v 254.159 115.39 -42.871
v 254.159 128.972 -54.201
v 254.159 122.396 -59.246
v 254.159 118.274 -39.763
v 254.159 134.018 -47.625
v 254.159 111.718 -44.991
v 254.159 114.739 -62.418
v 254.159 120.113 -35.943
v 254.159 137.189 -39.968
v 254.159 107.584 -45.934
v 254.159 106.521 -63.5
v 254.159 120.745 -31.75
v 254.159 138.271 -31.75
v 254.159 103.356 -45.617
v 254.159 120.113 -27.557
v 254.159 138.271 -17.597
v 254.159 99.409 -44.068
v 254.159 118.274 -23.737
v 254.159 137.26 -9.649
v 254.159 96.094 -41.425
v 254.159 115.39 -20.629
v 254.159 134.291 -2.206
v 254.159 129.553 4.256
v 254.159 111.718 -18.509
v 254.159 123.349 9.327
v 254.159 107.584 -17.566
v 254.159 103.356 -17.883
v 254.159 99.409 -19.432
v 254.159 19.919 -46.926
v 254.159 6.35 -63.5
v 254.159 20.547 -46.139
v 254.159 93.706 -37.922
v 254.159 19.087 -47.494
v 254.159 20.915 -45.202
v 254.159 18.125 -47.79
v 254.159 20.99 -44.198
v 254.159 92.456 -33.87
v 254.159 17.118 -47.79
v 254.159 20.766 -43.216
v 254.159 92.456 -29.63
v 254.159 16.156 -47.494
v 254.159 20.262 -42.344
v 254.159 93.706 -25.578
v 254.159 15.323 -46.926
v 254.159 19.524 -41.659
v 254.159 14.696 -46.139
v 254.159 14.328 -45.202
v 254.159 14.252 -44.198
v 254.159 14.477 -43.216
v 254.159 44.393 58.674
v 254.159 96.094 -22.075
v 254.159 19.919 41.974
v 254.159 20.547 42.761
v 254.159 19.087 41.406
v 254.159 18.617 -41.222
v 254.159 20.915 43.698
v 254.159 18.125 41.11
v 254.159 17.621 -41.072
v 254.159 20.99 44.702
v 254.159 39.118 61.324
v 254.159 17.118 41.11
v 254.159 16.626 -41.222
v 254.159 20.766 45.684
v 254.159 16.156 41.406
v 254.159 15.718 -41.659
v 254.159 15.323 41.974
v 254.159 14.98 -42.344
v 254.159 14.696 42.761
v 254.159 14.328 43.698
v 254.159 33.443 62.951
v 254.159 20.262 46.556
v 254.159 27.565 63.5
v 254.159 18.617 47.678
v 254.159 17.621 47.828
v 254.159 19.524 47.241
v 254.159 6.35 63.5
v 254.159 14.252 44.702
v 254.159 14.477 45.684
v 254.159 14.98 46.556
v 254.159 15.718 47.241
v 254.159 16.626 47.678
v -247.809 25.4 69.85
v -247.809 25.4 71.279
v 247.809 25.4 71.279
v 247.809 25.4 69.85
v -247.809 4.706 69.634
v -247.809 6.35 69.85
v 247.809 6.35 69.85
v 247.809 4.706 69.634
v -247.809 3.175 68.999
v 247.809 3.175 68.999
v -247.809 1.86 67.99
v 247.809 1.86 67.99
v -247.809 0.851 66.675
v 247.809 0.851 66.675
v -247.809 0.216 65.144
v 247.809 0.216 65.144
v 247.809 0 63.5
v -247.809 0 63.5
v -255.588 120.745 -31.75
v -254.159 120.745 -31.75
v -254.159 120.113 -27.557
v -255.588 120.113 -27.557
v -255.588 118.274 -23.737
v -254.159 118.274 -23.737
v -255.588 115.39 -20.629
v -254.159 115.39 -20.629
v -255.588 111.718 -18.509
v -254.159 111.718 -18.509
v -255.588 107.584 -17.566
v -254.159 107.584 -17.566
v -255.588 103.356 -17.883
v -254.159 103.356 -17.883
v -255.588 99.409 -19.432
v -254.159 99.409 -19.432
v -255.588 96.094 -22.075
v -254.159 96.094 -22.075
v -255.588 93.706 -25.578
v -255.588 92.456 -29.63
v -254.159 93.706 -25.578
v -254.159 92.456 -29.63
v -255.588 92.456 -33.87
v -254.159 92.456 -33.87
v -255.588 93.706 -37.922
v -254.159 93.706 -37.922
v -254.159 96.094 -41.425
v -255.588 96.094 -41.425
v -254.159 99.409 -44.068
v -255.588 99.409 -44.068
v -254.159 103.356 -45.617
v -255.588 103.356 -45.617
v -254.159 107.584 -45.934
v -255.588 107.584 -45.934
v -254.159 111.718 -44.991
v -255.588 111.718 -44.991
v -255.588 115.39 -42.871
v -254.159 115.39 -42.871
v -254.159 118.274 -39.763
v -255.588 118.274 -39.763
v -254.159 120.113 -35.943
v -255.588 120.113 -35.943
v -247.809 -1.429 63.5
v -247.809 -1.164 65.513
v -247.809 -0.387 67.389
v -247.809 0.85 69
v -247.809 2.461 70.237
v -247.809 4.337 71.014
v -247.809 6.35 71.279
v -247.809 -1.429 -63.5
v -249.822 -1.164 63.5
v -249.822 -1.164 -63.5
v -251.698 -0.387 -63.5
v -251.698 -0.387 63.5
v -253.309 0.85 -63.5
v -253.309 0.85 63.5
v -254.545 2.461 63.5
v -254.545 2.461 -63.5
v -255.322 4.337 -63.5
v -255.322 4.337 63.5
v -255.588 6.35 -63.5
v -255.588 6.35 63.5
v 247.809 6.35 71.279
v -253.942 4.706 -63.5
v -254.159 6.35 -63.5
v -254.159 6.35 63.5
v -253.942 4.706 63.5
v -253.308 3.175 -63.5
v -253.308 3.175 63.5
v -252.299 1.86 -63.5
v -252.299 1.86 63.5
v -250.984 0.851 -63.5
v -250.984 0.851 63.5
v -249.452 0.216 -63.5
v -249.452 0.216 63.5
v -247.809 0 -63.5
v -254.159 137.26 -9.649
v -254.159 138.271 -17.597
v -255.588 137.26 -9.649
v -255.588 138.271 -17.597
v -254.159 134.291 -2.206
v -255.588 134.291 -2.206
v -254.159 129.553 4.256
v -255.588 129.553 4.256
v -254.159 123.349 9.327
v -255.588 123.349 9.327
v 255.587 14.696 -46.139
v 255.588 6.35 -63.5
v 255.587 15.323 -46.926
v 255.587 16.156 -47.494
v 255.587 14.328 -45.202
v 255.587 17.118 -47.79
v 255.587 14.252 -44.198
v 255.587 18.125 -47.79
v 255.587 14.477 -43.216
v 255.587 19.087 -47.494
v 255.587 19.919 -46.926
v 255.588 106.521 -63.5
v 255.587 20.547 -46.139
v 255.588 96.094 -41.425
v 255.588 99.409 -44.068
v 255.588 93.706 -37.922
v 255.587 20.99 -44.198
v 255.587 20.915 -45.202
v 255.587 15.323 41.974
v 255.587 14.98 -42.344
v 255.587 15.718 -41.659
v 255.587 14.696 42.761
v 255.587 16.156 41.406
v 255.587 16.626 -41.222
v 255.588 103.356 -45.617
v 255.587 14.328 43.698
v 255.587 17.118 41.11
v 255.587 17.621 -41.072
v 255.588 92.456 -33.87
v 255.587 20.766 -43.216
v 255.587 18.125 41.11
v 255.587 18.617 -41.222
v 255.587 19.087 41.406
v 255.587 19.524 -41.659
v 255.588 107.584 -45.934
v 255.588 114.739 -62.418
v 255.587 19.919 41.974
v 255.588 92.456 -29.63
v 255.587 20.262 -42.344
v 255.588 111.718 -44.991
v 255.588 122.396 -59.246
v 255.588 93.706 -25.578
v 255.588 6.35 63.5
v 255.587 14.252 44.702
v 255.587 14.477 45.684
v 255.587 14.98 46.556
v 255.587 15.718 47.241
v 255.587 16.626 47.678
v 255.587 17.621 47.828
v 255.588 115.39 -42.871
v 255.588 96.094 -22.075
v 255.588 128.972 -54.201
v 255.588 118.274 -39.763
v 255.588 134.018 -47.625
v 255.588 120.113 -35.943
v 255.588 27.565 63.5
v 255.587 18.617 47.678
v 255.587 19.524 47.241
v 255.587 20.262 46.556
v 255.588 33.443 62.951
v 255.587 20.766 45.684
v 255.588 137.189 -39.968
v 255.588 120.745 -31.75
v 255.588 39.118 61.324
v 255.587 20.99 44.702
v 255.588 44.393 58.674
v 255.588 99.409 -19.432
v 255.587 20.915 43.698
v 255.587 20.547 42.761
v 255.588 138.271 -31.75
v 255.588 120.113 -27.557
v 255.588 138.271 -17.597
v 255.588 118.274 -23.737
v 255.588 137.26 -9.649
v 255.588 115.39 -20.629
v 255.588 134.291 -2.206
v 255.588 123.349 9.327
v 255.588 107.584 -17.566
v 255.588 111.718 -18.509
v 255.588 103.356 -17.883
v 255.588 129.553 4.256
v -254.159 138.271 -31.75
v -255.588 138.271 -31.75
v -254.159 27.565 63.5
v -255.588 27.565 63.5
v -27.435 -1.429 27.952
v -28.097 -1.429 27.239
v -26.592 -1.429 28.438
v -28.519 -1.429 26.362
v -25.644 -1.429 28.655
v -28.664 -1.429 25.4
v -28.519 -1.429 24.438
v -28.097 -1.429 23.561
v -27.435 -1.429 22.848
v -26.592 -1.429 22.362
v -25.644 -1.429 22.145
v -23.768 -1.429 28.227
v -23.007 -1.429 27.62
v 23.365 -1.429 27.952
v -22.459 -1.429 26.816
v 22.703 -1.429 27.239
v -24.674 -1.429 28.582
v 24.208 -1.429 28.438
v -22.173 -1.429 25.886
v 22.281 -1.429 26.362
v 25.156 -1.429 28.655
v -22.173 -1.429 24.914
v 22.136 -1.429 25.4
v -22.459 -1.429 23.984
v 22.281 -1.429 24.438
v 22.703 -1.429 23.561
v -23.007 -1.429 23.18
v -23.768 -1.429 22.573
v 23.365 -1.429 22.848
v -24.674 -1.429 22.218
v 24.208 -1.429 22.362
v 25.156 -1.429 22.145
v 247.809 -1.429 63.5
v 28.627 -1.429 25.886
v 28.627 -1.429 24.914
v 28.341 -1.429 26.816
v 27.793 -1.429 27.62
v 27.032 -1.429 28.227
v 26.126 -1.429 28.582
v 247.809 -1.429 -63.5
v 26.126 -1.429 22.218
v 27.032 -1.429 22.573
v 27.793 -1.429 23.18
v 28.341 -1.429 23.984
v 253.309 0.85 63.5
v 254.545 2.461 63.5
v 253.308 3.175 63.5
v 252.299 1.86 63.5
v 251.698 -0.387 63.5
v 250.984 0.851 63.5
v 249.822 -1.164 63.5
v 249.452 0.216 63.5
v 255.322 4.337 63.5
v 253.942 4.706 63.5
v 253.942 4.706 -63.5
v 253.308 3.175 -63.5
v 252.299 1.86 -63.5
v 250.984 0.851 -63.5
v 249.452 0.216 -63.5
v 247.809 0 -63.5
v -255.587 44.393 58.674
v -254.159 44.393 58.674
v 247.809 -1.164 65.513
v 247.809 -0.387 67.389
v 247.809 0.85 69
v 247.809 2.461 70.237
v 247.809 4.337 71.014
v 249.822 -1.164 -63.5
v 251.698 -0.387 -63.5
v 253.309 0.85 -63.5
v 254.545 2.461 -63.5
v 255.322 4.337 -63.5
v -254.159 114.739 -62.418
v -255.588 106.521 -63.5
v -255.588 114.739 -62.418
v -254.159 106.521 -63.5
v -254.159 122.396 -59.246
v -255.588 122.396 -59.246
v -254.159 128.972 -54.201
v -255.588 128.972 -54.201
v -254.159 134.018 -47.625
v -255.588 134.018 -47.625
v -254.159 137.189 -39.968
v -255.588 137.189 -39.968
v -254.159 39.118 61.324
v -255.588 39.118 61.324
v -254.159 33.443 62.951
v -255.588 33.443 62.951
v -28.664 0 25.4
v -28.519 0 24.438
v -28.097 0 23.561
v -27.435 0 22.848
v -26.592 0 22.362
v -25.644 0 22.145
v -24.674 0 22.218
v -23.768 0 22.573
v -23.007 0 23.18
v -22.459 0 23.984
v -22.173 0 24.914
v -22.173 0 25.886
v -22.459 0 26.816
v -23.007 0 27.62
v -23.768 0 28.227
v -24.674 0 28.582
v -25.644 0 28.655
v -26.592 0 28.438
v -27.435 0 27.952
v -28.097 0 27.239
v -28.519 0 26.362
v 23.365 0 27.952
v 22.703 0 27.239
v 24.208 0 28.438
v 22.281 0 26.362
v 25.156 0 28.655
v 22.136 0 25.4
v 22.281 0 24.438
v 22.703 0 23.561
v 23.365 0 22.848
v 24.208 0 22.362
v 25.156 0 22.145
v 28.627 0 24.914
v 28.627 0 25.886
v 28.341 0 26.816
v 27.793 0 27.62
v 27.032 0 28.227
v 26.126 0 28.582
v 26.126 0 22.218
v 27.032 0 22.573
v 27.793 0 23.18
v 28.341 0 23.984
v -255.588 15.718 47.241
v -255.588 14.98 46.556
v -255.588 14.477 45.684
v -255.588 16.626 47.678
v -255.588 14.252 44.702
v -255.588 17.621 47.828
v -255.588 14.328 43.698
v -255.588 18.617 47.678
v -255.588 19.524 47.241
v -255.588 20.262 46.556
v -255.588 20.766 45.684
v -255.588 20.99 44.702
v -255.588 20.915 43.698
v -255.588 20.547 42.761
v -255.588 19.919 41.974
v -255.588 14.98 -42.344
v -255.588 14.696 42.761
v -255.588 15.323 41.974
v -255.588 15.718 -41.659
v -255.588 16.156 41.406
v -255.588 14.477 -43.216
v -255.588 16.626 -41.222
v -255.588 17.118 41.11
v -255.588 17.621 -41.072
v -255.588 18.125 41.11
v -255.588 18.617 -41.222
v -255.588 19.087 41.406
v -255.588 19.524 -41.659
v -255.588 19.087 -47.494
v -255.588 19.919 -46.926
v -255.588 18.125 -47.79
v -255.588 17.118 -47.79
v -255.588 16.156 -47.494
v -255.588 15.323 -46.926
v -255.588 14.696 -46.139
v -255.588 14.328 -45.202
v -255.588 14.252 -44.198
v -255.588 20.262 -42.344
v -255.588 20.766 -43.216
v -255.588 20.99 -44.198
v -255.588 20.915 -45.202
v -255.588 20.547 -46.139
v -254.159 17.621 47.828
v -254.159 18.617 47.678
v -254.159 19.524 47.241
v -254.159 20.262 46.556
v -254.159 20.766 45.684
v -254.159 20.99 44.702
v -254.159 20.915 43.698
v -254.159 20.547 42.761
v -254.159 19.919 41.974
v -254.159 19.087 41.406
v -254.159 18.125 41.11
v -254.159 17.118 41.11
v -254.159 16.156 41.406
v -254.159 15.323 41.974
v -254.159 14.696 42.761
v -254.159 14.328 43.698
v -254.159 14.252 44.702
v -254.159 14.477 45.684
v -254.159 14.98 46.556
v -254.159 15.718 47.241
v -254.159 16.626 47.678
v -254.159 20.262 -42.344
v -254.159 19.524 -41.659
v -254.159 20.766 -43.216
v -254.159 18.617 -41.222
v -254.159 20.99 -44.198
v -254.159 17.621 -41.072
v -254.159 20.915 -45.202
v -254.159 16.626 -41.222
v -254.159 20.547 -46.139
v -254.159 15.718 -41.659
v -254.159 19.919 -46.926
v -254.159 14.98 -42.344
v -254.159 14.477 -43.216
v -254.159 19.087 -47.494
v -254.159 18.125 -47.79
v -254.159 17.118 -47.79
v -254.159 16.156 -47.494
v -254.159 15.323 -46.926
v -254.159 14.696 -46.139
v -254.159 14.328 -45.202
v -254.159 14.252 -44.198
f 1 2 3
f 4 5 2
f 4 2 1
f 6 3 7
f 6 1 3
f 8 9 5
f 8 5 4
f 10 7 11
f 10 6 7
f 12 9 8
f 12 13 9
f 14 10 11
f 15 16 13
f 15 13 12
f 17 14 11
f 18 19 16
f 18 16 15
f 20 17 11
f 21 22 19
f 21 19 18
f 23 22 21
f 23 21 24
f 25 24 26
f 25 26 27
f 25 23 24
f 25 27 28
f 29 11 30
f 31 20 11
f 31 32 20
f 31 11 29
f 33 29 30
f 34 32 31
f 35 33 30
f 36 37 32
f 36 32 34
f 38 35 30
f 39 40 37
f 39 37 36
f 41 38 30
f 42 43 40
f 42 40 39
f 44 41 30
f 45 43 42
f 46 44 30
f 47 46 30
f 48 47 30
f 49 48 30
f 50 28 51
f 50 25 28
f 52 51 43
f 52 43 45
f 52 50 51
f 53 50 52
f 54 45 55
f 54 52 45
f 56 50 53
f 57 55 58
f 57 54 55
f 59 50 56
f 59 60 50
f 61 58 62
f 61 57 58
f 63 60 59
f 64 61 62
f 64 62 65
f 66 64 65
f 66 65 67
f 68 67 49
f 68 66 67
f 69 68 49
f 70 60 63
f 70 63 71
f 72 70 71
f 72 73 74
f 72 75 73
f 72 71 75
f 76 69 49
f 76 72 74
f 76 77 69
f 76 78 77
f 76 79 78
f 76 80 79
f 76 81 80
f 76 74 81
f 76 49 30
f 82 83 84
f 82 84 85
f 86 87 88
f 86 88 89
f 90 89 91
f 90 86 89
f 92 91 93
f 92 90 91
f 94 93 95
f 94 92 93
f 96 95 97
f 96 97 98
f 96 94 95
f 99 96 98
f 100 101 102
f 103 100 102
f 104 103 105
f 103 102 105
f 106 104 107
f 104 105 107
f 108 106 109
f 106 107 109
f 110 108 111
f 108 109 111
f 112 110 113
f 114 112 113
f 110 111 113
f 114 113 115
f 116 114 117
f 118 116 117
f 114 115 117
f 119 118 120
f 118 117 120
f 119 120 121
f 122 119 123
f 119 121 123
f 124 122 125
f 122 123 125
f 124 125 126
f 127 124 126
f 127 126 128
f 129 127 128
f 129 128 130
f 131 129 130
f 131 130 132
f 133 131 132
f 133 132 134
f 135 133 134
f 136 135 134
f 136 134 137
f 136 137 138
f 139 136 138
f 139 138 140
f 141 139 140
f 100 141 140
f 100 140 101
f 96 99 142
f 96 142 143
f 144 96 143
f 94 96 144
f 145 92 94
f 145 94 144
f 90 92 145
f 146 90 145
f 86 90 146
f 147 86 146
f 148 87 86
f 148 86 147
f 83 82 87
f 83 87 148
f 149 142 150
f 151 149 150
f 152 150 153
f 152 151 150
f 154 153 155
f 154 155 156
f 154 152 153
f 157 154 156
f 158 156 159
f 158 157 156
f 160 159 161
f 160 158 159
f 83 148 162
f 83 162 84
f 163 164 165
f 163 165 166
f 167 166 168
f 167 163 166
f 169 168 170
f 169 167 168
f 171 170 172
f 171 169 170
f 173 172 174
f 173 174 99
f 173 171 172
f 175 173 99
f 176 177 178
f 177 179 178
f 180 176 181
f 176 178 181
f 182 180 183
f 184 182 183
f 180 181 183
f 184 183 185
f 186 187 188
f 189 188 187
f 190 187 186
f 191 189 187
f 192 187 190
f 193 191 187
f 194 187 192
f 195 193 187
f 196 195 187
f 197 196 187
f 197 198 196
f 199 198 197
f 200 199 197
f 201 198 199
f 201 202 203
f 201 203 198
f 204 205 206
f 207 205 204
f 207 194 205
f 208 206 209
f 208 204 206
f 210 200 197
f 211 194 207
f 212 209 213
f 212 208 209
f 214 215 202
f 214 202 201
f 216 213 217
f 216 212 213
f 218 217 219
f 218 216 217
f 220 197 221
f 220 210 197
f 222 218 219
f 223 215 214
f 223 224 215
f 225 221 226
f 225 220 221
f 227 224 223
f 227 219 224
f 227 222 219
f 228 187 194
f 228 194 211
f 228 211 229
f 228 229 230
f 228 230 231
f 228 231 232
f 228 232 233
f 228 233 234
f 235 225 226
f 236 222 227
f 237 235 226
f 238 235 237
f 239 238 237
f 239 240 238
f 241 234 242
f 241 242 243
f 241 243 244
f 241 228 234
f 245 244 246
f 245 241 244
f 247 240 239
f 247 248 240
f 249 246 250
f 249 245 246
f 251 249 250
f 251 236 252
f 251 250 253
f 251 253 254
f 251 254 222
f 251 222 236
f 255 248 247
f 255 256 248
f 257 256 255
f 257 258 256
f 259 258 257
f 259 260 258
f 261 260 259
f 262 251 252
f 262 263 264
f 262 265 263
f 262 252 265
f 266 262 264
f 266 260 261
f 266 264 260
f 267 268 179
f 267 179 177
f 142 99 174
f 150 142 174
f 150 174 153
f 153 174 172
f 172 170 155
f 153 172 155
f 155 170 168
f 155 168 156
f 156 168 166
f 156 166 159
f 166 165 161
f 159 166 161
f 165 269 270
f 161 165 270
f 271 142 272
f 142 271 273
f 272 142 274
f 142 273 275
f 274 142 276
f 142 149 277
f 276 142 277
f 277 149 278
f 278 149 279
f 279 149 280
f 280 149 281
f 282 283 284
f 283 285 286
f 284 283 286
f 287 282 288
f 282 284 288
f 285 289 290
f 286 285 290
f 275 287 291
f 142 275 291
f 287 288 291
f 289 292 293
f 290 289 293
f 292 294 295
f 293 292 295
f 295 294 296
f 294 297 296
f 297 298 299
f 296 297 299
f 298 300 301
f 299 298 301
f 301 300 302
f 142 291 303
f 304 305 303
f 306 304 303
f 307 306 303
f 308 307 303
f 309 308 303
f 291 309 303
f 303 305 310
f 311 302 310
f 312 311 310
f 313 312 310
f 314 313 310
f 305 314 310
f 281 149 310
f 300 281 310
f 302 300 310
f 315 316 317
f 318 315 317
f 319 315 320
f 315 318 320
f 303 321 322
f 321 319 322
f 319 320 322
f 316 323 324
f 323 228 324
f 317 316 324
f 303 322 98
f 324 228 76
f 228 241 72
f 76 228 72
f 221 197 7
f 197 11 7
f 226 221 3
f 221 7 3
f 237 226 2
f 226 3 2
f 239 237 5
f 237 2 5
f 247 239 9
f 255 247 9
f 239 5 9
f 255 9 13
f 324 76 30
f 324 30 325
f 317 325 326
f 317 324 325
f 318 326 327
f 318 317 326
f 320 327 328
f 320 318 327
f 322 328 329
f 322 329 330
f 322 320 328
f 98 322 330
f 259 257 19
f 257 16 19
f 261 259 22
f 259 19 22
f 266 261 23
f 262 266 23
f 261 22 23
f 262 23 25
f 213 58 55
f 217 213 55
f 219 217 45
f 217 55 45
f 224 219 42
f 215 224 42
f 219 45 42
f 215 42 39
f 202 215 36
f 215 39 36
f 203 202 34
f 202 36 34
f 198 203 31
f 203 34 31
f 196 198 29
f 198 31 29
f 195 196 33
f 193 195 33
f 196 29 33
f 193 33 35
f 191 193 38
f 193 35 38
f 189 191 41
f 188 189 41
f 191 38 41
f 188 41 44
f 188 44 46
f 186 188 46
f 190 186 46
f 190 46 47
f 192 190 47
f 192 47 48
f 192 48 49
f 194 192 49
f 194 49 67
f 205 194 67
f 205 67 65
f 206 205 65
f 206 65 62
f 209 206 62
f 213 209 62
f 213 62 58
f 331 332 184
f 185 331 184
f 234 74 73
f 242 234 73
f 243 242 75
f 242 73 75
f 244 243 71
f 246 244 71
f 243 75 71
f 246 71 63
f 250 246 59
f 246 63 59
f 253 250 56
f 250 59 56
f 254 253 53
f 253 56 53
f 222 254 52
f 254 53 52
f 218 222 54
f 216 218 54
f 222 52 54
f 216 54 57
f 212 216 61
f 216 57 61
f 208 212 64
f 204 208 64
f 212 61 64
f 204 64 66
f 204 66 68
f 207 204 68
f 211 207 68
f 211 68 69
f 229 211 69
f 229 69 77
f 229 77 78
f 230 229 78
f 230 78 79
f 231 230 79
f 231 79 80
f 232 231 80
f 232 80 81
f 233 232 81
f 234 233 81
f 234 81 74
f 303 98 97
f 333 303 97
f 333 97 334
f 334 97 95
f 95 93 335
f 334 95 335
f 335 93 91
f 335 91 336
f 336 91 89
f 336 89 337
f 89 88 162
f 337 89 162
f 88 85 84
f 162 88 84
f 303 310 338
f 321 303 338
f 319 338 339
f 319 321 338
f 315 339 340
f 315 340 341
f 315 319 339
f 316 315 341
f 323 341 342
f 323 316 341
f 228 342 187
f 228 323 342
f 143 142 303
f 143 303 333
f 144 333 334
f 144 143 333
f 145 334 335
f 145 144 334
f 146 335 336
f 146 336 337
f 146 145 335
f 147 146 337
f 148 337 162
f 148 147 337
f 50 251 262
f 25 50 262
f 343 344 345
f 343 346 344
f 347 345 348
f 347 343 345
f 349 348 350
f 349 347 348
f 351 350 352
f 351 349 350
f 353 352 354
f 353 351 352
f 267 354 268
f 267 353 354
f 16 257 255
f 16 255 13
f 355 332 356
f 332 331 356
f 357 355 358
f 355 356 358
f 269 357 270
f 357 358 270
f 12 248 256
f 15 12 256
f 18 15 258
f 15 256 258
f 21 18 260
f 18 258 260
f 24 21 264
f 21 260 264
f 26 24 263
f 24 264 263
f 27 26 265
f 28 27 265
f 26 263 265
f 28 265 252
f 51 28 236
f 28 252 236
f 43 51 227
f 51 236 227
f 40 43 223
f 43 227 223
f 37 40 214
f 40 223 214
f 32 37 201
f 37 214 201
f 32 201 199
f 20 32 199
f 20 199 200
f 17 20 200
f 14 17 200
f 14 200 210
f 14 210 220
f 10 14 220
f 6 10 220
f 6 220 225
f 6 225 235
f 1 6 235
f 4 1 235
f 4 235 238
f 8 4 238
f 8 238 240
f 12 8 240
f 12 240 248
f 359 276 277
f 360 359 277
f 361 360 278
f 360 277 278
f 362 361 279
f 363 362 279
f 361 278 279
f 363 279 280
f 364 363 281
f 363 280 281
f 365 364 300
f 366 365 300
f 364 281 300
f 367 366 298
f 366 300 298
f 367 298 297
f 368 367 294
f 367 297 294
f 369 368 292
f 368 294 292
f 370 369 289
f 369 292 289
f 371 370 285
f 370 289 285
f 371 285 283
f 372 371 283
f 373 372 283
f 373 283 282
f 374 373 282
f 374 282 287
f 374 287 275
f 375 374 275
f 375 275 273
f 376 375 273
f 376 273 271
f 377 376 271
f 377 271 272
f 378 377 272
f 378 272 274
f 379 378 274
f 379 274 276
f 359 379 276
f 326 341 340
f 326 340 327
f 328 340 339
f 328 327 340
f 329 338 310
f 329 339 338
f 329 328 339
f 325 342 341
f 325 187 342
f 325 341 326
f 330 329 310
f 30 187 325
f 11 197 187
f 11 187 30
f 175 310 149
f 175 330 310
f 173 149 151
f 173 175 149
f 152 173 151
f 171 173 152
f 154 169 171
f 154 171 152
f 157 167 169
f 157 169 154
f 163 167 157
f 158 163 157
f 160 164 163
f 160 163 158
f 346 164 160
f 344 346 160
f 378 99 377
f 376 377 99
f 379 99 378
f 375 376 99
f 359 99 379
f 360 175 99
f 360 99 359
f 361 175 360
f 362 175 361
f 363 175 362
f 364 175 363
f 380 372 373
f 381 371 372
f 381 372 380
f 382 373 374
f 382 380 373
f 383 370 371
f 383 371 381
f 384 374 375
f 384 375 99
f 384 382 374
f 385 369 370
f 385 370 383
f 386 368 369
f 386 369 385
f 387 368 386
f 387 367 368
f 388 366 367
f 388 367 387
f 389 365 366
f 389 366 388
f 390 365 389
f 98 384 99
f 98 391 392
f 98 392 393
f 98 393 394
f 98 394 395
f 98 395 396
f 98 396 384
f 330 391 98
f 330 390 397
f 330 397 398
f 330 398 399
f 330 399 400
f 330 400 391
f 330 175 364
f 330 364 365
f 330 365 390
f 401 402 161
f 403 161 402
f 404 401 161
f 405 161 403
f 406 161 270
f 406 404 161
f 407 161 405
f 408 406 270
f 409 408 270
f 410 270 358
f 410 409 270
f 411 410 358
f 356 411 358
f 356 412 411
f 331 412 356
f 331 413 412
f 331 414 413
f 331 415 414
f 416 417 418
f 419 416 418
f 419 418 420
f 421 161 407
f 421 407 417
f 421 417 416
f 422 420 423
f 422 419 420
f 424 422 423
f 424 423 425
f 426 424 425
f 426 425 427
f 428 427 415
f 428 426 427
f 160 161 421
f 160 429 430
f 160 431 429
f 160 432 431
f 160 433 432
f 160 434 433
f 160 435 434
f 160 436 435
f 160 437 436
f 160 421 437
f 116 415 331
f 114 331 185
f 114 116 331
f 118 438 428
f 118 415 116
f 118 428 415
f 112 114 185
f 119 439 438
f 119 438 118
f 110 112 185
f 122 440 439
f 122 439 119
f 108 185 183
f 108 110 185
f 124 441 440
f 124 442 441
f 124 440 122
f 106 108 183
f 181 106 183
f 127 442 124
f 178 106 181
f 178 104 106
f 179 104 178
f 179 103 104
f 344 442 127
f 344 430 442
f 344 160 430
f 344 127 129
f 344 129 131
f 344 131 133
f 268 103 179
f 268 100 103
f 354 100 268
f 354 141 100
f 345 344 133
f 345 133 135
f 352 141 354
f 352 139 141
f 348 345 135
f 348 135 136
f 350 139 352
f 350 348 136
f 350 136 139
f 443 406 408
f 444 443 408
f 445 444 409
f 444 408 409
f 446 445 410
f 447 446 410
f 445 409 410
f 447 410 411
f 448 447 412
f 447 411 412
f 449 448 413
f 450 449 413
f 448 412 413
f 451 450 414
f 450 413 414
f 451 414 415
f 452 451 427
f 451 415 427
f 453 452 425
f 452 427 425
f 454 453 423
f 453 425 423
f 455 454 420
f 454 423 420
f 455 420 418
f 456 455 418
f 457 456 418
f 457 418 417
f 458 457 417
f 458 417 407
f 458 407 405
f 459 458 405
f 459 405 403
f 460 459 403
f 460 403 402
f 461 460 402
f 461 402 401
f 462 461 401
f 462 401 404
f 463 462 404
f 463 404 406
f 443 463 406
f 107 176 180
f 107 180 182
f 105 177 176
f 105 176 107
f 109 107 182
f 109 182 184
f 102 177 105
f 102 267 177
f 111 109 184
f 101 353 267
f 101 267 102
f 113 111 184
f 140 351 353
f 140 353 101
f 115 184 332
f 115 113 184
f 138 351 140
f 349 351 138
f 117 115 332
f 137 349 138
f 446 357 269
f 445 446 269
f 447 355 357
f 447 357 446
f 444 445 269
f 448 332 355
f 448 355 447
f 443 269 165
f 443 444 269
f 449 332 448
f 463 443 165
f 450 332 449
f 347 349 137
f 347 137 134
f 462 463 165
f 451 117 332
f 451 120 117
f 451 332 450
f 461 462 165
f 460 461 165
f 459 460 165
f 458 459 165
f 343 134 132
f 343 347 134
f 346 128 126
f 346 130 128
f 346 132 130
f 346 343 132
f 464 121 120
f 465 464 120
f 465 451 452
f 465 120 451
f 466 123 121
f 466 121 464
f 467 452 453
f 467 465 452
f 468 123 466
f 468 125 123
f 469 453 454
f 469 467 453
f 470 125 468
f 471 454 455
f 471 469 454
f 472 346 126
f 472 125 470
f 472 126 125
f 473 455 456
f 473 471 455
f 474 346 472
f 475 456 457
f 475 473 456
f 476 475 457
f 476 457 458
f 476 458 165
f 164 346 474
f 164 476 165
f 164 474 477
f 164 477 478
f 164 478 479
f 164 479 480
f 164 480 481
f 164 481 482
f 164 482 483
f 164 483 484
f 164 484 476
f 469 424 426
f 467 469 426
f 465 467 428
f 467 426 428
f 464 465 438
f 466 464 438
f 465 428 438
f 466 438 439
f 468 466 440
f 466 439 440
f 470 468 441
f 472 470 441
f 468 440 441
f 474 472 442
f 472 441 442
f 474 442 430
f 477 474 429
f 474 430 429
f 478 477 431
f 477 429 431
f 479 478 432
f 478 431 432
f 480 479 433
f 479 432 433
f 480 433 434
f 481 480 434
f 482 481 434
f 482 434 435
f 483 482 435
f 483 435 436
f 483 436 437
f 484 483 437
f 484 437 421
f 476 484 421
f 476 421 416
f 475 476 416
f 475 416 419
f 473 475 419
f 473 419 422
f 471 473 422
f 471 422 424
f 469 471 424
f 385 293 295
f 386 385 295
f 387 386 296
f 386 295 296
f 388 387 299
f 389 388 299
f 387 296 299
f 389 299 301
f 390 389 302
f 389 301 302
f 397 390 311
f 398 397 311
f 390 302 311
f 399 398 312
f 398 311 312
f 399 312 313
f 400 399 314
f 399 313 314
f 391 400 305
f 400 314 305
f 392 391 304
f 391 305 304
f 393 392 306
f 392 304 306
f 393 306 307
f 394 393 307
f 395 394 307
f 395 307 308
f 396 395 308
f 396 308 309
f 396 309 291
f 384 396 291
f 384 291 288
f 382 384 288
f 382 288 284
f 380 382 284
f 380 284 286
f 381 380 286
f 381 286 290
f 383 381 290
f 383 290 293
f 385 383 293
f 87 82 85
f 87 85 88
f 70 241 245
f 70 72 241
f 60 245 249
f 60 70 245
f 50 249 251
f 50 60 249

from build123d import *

# Parameters (mm, degrees)
SKETCH1_W                      = 511.175
SKETCH1_H                      = 127
BASE_FLANGE1_DEPTH             = 1.42875
EDGE_FLANGE1_STRIP_W           = 18.415
EDGE_FLANGE1_STRIP_H           = 1.42875
EDGE_FLANGE1_STRIP_CUT_DEPTH   = 127
EDGE_FLANGE1_STRIP_2_W         = 18.415
EDGE_FLANGE1_STRIP_2_H         = 1.42875
EDGE_FLANGE1_STRIP_CUT_2_DEPTH = 127
EDGE_FLANGE1_DEPTH             = 127
EDGE_FLANGE1_BEND_DEPTH        = 127
CUT_EXTRUDE1_DEPTH             = 534.339544007
FILLET1_R                      = 31.75
SKETCH14_R                     = 14.224
CUT_EXTRUDE2_DEPTH             = 534.339544007
H_0_266_DIAMETER_HOLE1_D       = 6.7564
F_0_257_DIAMETER_HOLE2_D       = 6.5278
EDGE_FLANGE2_DEPTH             = 495.6175


# Sheet-metal steps are written as plain solids
with BuildPart() as part:
    # Sketch1 → Base-Flange1 (new body)
    with BuildSketch(Plane(origin=(0, 0, 0), x_dir=(1, 0, 0), z_dir=(0, 1, 0))):
        Rectangle(SKETCH1_W, SKETCH1_H)
    extrude(amount=-BASE_FLANGE1_DEPTH)

    # Edge-Flange1 strip (across the edge) → Edge-Flange1 strip cut (cut)
    with BuildSketch(Plane(origin=(255.5875, 0, 63.5), x_dir=(-1, 0, 0), z_dir=(0, 0, -1))):
        with Locations((-1.42875, -0.714375)):
            Rectangle(EDGE_FLANGE1_STRIP_W, EDGE_FLANGE1_STRIP_H)
    extrude(amount=EDGE_FLANGE1_STRIP_CUT_DEPTH, mode=Mode.SUBTRACT)

    # Edge-Flange1 strip 2 (across the edge) → Edge-Flange1 strip cut 2 (cut)
    with BuildSketch(Plane(origin=(-255.5875, 0, -63.5), x_dir=(1, 0, 0), z_dir=(0, 0, 1))):
        with Locations((-1.42875, -0.714375)):
            Rectangle(EDGE_FLANGE1_STRIP_2_W, EDGE_FLANGE1_STRIP_2_H)
    extrude(amount=EDGE_FLANGE1_STRIP_CUT_2_DEPTH, mode=Mode.SUBTRACT)

    # Edge-Flange1 section (across the edge) → Edge-Flange1 (add)
    with BuildSketch(Plane(origin=(255.5875, 0, 63.5), x_dir=(-1, 0, 0), z_dir=(0, 0, -1))):
        with BuildLine():
            Line((0, 6.35), (0, 138.27125))
            Line((0, 138.27125), (1.42875, 138.27125))
            Line((1.42875, 138.27125), (1.42875, 6.35))
            ThreePointArc((1.42875, 6.35), (3.288621939, 1.859871939), (7.77875, 0))
            Line((7.77875, 0), (7.77875, -1.42875))
            ThreePointArc((7.77875, -1.42875), (2.278343126, 0.849593126), (0, 6.35))
        make_face()
    extrude(amount=EDGE_FLANGE1_DEPTH)

    # Edge-Flange1 section 2 (across the edge) → Edge-Flange1 bend (add)
    with BuildSketch(Plane(origin=(-255.5875, 0, -63.5), x_dir=(1, 0, 0), z_dir=(0, 0, 1))):
        with BuildLine():
            Line((0, 6.35), (0, 138.27125))
            Line((0, 138.27125), (1.42875, 138.27125))
            Line((1.42875, 138.27125), (1.42875, 6.35))
            ThreePointArc((1.42875, 6.35), (3.288621939, 1.859871939), (7.77875, 0))
            Line((7.77875, 0), (7.77875, -1.42875))
            ThreePointArc((7.77875, -1.42875), (2.278343126, 0.849593126), (0, 6.35))
        make_face()
    extrude(amount=EDGE_FLANGE1_BEND_DEPTH)

    # Sketch13 → Cut-Extrude1 (cut, through all)
    with BuildSketch(Plane(origin=(255.5875, 0, 0), x_dir=(0, 0, -1), z_dir=(1, 0, 0))):
        Polygon((-63.5, 36.67125), (0, 138.27125), (-63.5, 138.27125), align=None)
    extrude(amount=-CUT_EXTRUDE1_DEPTH, mode=Mode.SUBTRACT)

    # Fillet1
    fillet1_edges = [part.edges().sort_by_distance(p)[0] for p in [
        (254.873125, 138.27125, -63.5),
        (-254.873125, 138.27125, -63.5),
        (254.873125, 138.27125, 0),
        (254.873125, 36.67125, 63.5),
        (-254.873125, 138.27125, 0),
        (-254.873125, 36.67125, 63.5),
    ]]
    fillet(fillet1_edges, radius=FILLET1_R)

    # Sketch14 → Cut-Extrude2 (cut, through all)
    with BuildSketch(Plane(origin=(255.5875, 0, 0), x_dir=(0, 0, -1), z_dir=(1, 0, 0))):
        with Locations(Location((31.75, 106.52125, 0), (0, 0, 90))):
            Circle(SKETCH14_R)
    extrude(amount=-CUT_EXTRUDE2_DEPTH, mode=Mode.SUBTRACT)

    # H (0.266) Diameter Hole1 (through all)
    with Locations(Plane(origin=(255.5875, 0, 0), x_dir=(0, 0, -1), z_dir=(1, 0, 0))):
        with Locations((-44.45, 17.62125), (44.45, 17.62125)):
            Hole(H_0_266_DIAMETER_HOLE1_D / 2)

    # F (0.257) Diameter Hole2 (through all)
    with Locations(Plane(origin=(0, 0, 0), x_dir=(1, 0, 0), z_dir=(0, 1, 0))):
        with Locations((-25.4, -25.4), (25.4, -25.4)):
            Hole(F_0_257_DIAMETER_HOLE2_D / 2)

    # Edge-Flange2 section (across the edge) → Edge-Flange2 (add)
    with BuildSketch(Plane(origin=(-247.80875, 0, 69.85), x_dir=(0, 0, -1), z_dir=(1, 0, 0))):
        with BuildLine():
            Line((-1.42875, 6.35), (-1.42875, 25.4))
            Line((-1.42875, 25.4), (0, 25.4))
            Line((0, 25.4), (0, 6.35))
            ThreePointArc((0, 6.35), (1.859871939, 1.859871939), (6.35, 0))
            Line((6.35, 0), (6.35, -1.42875))
            ThreePointArc((6.35, -1.42875), (0.849593126, 0.849593126), (-1.42875, 6.35))
        make_face()
    extrude(amount=EDGE_FLANGE2_DEPTH)


solid = part.part
